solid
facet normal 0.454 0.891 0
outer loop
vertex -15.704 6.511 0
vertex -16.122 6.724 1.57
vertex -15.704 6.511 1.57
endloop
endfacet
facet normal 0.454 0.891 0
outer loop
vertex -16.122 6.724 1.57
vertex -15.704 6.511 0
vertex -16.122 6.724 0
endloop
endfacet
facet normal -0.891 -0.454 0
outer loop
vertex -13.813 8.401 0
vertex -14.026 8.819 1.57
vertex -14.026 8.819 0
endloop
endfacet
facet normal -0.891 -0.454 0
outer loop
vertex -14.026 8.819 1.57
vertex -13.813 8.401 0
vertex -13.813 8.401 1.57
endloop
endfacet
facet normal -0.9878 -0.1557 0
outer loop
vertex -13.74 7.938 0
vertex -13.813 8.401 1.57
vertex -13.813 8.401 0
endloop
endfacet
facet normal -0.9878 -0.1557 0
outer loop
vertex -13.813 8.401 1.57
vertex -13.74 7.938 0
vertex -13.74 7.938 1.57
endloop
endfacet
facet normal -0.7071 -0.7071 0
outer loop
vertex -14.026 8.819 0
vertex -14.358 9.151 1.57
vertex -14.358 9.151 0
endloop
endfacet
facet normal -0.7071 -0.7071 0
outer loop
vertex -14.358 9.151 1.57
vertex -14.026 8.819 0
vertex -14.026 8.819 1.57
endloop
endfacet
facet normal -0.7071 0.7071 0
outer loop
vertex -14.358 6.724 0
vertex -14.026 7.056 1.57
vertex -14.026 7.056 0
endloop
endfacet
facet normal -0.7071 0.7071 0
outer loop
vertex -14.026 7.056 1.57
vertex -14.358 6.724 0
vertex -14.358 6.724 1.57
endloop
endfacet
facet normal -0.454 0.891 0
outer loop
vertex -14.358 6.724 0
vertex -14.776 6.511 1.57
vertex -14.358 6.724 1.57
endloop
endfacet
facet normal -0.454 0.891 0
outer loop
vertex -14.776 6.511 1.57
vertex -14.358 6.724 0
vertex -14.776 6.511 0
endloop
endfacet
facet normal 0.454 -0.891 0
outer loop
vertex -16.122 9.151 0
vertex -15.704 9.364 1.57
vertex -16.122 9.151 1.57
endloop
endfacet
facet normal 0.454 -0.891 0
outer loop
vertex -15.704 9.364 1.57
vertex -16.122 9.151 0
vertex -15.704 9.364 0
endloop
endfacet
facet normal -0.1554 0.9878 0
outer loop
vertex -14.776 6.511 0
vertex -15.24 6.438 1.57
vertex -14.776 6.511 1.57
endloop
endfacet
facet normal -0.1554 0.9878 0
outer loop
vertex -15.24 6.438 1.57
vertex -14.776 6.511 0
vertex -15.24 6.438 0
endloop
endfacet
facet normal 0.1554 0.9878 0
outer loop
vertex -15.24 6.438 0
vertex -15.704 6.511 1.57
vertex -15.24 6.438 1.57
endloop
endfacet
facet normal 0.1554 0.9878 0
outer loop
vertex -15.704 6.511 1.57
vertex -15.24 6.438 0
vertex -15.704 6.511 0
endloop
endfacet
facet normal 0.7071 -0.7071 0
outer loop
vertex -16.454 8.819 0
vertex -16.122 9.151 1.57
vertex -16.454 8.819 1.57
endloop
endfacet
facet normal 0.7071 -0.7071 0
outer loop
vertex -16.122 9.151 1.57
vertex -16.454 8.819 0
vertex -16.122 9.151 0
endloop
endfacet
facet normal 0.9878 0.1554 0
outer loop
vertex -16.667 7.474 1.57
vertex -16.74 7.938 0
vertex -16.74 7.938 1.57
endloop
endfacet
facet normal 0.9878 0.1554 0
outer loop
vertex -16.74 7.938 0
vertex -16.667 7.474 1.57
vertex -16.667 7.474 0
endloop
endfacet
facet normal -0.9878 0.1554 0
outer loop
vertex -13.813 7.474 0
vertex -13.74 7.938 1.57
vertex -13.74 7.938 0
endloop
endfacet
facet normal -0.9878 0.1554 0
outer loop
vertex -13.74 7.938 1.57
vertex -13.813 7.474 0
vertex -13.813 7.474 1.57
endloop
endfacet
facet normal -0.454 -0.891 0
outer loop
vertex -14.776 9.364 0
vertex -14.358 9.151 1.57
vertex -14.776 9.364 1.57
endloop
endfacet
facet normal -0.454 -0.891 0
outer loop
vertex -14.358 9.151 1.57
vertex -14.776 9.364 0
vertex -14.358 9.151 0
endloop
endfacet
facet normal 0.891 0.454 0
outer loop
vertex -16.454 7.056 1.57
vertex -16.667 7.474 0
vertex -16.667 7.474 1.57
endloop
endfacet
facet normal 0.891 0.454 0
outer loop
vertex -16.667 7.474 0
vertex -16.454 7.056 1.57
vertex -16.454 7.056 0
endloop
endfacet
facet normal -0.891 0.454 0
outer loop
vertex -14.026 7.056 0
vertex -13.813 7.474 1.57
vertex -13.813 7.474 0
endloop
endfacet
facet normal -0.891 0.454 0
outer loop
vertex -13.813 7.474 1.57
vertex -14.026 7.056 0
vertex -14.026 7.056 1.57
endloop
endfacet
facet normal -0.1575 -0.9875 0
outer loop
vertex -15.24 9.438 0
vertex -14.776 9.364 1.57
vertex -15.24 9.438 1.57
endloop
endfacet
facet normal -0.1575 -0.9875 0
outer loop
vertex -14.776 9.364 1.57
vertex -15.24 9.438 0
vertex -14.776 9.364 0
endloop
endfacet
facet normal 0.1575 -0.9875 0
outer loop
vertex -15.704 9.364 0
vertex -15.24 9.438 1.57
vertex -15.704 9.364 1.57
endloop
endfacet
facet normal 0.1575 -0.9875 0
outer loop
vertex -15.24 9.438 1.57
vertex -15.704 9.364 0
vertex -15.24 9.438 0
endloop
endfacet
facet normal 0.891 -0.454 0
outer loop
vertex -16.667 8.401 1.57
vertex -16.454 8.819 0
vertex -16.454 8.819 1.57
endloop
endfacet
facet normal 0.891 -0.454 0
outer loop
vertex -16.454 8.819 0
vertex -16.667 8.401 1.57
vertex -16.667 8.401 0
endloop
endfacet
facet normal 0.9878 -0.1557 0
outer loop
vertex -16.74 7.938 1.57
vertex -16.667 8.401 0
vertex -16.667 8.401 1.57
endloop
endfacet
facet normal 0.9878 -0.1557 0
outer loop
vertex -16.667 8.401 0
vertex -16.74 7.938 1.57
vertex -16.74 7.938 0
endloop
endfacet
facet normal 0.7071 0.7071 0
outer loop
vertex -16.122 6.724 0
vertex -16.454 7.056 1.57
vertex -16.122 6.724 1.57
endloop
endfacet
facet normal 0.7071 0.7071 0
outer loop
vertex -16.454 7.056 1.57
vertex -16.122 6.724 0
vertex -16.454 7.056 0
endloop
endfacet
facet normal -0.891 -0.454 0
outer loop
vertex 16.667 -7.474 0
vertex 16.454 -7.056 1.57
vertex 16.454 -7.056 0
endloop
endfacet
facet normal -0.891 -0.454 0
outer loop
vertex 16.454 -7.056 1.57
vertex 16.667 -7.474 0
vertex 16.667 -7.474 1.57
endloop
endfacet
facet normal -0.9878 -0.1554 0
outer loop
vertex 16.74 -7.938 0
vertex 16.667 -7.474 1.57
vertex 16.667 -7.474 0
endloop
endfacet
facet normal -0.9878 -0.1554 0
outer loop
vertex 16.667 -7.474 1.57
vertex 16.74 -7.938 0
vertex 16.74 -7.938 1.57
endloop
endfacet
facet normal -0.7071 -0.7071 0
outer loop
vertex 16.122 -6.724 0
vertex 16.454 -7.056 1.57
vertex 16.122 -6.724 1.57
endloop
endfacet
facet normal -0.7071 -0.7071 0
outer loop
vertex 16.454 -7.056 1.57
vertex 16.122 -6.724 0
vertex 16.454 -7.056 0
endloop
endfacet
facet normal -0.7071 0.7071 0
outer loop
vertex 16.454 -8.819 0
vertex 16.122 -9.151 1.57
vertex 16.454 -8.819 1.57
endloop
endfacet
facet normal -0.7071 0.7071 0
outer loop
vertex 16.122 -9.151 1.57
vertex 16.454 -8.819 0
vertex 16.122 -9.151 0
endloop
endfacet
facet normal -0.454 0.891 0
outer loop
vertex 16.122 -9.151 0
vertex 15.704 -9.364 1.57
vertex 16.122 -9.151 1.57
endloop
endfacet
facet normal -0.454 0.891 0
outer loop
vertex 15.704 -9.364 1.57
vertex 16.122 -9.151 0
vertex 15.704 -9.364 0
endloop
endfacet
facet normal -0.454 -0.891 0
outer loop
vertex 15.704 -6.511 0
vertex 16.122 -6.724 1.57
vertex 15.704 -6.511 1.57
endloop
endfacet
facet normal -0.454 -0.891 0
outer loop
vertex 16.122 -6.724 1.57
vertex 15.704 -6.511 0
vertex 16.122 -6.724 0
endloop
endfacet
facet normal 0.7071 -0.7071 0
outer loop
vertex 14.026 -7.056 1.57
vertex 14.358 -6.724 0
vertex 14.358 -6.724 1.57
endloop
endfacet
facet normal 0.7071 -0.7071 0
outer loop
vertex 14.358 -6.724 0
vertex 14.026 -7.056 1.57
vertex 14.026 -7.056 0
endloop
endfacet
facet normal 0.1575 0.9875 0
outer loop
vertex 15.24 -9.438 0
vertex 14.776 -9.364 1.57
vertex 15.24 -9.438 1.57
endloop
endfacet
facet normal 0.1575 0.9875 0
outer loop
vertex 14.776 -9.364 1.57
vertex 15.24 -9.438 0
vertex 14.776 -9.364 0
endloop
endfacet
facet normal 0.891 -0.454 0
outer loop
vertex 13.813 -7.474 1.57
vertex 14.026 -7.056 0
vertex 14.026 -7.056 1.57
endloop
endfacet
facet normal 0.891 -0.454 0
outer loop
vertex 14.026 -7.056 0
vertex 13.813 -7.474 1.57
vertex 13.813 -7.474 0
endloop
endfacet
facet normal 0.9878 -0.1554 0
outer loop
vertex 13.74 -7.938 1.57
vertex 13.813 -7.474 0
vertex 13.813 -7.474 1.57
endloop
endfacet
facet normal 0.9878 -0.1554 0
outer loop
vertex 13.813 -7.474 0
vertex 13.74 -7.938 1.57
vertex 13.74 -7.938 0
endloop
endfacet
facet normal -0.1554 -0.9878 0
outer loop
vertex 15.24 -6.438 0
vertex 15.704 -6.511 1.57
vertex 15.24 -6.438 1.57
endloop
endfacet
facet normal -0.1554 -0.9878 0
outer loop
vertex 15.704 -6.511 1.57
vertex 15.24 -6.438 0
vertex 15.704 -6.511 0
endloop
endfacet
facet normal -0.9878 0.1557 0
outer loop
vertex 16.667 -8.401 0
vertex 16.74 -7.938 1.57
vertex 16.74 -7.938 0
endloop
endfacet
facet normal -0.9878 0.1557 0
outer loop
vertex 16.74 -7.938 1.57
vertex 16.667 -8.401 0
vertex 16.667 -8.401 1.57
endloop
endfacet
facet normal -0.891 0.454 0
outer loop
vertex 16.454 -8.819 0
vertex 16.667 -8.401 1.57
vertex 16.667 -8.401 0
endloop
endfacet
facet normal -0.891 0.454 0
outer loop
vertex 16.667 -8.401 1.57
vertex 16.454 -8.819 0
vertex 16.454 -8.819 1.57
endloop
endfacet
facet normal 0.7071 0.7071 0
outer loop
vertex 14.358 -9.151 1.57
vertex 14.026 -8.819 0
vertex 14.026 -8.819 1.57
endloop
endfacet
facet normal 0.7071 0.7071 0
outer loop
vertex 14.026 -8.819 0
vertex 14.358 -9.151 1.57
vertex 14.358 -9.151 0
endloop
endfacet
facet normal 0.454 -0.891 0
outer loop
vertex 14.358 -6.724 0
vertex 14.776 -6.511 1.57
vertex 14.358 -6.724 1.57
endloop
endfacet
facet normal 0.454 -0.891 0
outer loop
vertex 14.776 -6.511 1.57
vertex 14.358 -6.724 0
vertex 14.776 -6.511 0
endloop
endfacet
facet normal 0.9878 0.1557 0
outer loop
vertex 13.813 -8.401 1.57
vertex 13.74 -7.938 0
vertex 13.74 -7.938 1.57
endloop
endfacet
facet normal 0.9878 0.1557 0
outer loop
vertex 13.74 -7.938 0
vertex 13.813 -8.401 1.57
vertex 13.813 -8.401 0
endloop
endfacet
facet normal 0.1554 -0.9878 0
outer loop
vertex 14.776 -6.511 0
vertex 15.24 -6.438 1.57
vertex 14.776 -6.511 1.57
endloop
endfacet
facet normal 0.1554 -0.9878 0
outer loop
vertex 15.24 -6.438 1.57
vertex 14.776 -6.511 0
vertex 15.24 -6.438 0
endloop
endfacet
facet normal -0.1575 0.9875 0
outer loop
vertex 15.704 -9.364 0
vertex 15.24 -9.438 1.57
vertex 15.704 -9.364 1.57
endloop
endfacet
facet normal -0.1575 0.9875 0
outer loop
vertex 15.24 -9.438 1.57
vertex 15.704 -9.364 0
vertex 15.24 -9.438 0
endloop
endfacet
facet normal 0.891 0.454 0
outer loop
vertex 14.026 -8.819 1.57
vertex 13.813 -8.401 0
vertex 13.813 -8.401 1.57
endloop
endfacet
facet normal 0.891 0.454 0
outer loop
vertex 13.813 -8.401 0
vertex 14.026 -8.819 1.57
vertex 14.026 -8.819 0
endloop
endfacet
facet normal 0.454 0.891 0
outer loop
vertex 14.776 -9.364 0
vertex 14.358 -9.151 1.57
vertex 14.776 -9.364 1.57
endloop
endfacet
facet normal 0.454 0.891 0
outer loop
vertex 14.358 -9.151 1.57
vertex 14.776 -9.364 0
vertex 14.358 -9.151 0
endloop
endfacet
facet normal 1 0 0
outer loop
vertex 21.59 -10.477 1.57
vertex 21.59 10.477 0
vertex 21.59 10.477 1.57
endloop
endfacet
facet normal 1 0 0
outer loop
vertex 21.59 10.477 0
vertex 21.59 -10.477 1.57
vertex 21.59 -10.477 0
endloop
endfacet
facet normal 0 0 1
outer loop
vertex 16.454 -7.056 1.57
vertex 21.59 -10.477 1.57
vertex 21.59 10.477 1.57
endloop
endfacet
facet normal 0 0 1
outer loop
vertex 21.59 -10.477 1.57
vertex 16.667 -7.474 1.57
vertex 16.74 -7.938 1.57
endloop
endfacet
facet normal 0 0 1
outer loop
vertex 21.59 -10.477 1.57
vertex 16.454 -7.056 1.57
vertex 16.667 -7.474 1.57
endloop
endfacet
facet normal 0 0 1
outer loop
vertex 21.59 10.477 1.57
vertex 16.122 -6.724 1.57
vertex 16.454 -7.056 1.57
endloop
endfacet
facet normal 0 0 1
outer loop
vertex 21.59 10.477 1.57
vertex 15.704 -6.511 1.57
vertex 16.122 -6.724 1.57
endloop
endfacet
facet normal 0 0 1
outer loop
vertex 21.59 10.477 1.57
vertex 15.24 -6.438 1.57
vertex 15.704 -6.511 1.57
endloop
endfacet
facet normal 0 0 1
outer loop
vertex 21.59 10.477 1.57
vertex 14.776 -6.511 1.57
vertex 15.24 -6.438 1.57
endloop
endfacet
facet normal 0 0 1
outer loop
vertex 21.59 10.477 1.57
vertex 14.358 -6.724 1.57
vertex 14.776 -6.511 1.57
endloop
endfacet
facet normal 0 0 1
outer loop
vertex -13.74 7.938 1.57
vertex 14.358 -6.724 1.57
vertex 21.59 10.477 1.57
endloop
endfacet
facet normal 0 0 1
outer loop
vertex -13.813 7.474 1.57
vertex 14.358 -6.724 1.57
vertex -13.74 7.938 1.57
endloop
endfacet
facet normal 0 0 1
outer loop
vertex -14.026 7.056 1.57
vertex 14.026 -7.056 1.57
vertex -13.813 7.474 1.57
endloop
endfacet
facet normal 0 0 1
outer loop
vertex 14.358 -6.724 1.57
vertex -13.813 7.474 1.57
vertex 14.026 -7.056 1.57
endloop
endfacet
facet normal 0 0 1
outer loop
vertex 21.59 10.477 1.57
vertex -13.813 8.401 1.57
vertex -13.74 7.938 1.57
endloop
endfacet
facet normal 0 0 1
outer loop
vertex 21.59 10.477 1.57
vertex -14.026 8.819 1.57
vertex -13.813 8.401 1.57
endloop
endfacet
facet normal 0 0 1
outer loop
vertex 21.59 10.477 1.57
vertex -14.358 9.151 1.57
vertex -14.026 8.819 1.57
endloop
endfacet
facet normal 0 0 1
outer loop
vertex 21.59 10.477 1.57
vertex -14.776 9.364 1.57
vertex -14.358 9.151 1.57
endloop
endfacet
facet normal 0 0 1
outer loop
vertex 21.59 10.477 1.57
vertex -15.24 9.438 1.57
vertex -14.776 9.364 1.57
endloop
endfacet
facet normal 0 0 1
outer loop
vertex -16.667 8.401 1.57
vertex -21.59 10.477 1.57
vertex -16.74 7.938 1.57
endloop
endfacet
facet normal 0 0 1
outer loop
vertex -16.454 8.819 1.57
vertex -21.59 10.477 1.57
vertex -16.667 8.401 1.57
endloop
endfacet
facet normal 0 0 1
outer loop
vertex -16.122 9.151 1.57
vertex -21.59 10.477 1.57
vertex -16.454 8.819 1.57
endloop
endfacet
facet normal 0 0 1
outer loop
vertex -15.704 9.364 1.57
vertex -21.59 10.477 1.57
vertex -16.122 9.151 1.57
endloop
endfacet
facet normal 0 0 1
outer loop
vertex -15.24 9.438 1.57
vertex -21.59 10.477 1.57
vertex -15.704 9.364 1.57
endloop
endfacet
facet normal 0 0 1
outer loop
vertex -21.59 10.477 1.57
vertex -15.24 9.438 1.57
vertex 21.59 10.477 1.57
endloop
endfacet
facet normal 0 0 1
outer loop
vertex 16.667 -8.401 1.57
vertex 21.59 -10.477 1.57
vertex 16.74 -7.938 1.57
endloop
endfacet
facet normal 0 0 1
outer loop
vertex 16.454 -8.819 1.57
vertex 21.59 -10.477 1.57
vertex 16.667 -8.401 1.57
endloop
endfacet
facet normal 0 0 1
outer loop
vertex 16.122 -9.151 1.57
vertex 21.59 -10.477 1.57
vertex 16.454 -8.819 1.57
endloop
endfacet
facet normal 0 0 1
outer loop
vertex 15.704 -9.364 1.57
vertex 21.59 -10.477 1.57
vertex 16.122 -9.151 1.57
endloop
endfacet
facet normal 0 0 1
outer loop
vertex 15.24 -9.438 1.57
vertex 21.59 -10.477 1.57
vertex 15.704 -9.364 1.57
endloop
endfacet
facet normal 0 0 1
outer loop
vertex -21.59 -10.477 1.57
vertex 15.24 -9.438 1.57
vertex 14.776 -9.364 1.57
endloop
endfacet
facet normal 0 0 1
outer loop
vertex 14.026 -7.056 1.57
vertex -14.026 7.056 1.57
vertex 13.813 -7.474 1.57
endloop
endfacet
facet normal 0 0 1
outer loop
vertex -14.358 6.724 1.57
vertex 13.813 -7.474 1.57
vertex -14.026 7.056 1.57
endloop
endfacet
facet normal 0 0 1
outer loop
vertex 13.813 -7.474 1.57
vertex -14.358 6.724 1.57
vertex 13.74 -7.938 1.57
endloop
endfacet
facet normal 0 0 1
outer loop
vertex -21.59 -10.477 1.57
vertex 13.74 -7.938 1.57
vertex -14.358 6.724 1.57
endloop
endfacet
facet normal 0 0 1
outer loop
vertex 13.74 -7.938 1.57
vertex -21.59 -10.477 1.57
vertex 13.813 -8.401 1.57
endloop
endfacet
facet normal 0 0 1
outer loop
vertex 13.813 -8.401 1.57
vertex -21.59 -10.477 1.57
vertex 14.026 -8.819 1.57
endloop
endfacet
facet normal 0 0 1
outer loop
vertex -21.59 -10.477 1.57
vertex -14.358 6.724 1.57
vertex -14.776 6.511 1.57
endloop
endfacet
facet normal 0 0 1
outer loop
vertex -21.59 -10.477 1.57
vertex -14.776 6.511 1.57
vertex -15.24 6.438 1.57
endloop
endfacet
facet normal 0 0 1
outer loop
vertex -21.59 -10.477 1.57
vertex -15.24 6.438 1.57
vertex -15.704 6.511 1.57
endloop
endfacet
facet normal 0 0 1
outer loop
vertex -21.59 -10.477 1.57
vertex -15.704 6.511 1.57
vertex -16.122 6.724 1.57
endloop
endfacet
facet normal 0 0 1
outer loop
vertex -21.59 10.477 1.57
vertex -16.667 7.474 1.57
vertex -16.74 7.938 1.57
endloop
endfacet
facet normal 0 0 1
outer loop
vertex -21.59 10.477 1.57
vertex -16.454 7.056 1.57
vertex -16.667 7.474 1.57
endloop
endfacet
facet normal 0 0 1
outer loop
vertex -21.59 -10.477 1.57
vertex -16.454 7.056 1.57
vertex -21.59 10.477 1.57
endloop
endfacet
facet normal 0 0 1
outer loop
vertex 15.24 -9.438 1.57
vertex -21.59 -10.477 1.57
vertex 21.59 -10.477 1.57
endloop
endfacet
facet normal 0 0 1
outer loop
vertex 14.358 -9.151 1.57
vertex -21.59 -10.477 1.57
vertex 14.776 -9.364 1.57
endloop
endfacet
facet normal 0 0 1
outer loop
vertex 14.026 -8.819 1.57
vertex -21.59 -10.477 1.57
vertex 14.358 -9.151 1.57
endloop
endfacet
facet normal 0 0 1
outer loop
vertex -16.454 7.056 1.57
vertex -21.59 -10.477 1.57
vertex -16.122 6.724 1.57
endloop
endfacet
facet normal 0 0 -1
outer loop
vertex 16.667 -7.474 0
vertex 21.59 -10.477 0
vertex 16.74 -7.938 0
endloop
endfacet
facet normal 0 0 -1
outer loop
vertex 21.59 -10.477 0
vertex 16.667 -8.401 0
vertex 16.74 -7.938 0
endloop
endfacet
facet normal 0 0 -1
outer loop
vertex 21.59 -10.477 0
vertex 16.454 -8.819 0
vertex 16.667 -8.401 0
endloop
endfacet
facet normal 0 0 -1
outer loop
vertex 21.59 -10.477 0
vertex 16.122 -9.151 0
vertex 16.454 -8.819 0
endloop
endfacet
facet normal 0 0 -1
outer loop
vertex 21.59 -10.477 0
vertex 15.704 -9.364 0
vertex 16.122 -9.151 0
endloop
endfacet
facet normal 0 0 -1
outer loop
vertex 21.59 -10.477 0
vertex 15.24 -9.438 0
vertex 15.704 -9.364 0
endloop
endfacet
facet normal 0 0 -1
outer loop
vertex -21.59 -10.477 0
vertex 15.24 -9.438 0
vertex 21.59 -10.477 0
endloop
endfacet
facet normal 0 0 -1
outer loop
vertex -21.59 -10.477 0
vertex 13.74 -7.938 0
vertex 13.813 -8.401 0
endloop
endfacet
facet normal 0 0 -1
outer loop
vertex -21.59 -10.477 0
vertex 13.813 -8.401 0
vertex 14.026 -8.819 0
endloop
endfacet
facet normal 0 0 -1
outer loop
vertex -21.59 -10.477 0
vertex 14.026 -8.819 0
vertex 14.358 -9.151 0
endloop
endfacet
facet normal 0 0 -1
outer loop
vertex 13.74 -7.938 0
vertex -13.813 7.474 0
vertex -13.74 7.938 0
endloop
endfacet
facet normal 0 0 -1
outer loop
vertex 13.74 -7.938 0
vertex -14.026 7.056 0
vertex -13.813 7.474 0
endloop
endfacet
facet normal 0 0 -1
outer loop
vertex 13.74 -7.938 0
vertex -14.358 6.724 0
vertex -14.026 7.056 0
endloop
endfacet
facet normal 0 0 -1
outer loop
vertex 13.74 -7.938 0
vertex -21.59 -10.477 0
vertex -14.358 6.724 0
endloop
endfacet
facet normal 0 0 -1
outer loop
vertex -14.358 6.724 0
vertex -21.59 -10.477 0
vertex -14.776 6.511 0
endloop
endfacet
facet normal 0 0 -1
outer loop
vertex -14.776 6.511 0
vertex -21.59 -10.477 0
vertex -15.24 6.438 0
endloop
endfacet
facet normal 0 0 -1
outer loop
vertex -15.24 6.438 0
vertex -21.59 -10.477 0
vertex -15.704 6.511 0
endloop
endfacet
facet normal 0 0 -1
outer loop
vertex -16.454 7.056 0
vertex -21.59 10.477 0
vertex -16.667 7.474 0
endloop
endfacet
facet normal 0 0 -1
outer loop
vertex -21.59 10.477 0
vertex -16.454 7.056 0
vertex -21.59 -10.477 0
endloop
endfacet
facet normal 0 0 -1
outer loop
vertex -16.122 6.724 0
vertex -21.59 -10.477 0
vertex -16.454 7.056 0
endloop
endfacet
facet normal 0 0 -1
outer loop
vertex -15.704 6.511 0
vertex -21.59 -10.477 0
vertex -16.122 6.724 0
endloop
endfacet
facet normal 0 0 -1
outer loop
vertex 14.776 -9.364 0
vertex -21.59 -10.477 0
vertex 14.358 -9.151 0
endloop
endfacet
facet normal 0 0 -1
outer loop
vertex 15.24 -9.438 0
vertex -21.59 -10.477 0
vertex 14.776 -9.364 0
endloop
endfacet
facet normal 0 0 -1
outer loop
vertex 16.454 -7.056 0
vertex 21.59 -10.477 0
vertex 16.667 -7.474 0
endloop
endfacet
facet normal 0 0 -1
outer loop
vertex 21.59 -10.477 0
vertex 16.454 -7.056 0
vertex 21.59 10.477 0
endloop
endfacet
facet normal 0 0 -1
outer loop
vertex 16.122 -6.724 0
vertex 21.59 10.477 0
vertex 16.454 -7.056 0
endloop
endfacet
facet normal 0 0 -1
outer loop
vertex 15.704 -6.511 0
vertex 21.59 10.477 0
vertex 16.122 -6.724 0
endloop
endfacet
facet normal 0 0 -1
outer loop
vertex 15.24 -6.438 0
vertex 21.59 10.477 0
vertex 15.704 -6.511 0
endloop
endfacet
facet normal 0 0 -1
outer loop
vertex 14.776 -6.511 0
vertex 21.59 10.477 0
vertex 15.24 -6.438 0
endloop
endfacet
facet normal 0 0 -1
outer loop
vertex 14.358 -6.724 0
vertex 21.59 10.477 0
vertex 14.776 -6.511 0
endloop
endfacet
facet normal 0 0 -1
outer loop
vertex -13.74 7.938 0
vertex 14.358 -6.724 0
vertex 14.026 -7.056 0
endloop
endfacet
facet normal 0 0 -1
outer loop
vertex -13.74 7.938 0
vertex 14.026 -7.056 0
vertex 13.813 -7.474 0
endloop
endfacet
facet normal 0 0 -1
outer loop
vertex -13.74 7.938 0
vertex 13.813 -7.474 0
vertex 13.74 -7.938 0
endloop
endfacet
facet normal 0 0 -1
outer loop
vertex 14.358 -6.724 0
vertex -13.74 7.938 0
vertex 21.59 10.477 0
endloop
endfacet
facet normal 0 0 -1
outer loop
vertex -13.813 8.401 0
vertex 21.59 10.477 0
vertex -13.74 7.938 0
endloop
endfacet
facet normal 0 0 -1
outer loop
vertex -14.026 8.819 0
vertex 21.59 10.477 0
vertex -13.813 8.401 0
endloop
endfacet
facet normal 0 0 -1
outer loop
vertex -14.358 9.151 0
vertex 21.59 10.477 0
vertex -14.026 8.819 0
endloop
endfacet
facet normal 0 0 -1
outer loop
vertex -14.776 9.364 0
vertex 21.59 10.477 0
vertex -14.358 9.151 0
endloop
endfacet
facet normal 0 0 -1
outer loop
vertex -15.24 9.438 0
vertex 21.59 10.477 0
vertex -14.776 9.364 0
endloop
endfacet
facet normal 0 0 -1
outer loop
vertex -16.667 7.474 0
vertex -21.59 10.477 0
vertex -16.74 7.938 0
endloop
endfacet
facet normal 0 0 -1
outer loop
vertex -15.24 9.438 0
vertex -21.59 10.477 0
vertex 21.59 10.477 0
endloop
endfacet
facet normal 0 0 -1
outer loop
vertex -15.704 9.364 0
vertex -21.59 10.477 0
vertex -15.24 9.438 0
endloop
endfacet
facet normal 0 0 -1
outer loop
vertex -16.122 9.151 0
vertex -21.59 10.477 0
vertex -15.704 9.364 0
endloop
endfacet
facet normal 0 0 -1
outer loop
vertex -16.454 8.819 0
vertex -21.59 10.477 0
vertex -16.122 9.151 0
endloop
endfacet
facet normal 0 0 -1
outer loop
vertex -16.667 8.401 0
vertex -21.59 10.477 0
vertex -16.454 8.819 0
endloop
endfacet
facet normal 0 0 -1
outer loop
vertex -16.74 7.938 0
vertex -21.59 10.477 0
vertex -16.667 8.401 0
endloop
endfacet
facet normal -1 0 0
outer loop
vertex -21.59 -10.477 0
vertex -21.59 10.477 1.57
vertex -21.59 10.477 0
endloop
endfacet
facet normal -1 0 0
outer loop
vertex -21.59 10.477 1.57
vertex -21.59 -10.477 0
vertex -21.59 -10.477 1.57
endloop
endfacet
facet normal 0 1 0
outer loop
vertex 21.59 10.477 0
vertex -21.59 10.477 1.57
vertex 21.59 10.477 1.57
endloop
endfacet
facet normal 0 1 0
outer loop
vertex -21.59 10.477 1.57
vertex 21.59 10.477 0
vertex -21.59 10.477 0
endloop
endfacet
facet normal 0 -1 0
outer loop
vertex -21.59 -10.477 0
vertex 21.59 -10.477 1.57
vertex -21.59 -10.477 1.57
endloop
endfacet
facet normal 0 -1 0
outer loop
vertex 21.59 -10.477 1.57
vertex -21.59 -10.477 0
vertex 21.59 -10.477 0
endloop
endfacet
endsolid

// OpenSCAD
// file: ../utils/struct.scad
function get(config, key) = config[search([key], config)[0]][1];

function set(config, key, value) = [for (elem = config) if (elem[0] != key) elem, [key, value]];
    
function join(config1, config2) = [for (elem = config1) elem, for (elem = config2) elem];
// main file
use <../utils/struct.scad>

function DCDCBoard_config() =
        let (
            pcb_height = 1.57,
            width = 17*2.54,
            height = 33*2.54/4,
            bore_diameter = 3,
            bore_dist_w = 10*2.54/4,
            bore_dist_h = 4*2.54/4
        ) [
            ["pcb_height", pcb_height],
            ["width", width],
            ["height", height],
            ["bore_diameter", bore_diameter],
            ["bore_dist_w", bore_dist_w],
            ["bore_dist_h", bore_dist_h]
        ];

module DCDCBoard(config) {
    width = get(config, "width");
    height = get(config, "height");
    bore_dist_w = get(config, "bore_dist_w");
    bore_dist_h = get(config, "bore_dist_h");
    pcb_height = get(config, "pcb_height");
    
    difference() {
        translate([-width/2, -height/2, 0])
        cube([width, height, pcb_height]);
        
        for (i = [-1, 1])
            translate([
                    i*(width/2 - bore_dist_w), 
                    -i*(height/2 - bore_dist_h),
                    -1])
            cylinder($fn=20, d = get(config, "bore_diameter"), h = 10);
    }
    
};

DCDCBoard(DCDCBoard_config());
